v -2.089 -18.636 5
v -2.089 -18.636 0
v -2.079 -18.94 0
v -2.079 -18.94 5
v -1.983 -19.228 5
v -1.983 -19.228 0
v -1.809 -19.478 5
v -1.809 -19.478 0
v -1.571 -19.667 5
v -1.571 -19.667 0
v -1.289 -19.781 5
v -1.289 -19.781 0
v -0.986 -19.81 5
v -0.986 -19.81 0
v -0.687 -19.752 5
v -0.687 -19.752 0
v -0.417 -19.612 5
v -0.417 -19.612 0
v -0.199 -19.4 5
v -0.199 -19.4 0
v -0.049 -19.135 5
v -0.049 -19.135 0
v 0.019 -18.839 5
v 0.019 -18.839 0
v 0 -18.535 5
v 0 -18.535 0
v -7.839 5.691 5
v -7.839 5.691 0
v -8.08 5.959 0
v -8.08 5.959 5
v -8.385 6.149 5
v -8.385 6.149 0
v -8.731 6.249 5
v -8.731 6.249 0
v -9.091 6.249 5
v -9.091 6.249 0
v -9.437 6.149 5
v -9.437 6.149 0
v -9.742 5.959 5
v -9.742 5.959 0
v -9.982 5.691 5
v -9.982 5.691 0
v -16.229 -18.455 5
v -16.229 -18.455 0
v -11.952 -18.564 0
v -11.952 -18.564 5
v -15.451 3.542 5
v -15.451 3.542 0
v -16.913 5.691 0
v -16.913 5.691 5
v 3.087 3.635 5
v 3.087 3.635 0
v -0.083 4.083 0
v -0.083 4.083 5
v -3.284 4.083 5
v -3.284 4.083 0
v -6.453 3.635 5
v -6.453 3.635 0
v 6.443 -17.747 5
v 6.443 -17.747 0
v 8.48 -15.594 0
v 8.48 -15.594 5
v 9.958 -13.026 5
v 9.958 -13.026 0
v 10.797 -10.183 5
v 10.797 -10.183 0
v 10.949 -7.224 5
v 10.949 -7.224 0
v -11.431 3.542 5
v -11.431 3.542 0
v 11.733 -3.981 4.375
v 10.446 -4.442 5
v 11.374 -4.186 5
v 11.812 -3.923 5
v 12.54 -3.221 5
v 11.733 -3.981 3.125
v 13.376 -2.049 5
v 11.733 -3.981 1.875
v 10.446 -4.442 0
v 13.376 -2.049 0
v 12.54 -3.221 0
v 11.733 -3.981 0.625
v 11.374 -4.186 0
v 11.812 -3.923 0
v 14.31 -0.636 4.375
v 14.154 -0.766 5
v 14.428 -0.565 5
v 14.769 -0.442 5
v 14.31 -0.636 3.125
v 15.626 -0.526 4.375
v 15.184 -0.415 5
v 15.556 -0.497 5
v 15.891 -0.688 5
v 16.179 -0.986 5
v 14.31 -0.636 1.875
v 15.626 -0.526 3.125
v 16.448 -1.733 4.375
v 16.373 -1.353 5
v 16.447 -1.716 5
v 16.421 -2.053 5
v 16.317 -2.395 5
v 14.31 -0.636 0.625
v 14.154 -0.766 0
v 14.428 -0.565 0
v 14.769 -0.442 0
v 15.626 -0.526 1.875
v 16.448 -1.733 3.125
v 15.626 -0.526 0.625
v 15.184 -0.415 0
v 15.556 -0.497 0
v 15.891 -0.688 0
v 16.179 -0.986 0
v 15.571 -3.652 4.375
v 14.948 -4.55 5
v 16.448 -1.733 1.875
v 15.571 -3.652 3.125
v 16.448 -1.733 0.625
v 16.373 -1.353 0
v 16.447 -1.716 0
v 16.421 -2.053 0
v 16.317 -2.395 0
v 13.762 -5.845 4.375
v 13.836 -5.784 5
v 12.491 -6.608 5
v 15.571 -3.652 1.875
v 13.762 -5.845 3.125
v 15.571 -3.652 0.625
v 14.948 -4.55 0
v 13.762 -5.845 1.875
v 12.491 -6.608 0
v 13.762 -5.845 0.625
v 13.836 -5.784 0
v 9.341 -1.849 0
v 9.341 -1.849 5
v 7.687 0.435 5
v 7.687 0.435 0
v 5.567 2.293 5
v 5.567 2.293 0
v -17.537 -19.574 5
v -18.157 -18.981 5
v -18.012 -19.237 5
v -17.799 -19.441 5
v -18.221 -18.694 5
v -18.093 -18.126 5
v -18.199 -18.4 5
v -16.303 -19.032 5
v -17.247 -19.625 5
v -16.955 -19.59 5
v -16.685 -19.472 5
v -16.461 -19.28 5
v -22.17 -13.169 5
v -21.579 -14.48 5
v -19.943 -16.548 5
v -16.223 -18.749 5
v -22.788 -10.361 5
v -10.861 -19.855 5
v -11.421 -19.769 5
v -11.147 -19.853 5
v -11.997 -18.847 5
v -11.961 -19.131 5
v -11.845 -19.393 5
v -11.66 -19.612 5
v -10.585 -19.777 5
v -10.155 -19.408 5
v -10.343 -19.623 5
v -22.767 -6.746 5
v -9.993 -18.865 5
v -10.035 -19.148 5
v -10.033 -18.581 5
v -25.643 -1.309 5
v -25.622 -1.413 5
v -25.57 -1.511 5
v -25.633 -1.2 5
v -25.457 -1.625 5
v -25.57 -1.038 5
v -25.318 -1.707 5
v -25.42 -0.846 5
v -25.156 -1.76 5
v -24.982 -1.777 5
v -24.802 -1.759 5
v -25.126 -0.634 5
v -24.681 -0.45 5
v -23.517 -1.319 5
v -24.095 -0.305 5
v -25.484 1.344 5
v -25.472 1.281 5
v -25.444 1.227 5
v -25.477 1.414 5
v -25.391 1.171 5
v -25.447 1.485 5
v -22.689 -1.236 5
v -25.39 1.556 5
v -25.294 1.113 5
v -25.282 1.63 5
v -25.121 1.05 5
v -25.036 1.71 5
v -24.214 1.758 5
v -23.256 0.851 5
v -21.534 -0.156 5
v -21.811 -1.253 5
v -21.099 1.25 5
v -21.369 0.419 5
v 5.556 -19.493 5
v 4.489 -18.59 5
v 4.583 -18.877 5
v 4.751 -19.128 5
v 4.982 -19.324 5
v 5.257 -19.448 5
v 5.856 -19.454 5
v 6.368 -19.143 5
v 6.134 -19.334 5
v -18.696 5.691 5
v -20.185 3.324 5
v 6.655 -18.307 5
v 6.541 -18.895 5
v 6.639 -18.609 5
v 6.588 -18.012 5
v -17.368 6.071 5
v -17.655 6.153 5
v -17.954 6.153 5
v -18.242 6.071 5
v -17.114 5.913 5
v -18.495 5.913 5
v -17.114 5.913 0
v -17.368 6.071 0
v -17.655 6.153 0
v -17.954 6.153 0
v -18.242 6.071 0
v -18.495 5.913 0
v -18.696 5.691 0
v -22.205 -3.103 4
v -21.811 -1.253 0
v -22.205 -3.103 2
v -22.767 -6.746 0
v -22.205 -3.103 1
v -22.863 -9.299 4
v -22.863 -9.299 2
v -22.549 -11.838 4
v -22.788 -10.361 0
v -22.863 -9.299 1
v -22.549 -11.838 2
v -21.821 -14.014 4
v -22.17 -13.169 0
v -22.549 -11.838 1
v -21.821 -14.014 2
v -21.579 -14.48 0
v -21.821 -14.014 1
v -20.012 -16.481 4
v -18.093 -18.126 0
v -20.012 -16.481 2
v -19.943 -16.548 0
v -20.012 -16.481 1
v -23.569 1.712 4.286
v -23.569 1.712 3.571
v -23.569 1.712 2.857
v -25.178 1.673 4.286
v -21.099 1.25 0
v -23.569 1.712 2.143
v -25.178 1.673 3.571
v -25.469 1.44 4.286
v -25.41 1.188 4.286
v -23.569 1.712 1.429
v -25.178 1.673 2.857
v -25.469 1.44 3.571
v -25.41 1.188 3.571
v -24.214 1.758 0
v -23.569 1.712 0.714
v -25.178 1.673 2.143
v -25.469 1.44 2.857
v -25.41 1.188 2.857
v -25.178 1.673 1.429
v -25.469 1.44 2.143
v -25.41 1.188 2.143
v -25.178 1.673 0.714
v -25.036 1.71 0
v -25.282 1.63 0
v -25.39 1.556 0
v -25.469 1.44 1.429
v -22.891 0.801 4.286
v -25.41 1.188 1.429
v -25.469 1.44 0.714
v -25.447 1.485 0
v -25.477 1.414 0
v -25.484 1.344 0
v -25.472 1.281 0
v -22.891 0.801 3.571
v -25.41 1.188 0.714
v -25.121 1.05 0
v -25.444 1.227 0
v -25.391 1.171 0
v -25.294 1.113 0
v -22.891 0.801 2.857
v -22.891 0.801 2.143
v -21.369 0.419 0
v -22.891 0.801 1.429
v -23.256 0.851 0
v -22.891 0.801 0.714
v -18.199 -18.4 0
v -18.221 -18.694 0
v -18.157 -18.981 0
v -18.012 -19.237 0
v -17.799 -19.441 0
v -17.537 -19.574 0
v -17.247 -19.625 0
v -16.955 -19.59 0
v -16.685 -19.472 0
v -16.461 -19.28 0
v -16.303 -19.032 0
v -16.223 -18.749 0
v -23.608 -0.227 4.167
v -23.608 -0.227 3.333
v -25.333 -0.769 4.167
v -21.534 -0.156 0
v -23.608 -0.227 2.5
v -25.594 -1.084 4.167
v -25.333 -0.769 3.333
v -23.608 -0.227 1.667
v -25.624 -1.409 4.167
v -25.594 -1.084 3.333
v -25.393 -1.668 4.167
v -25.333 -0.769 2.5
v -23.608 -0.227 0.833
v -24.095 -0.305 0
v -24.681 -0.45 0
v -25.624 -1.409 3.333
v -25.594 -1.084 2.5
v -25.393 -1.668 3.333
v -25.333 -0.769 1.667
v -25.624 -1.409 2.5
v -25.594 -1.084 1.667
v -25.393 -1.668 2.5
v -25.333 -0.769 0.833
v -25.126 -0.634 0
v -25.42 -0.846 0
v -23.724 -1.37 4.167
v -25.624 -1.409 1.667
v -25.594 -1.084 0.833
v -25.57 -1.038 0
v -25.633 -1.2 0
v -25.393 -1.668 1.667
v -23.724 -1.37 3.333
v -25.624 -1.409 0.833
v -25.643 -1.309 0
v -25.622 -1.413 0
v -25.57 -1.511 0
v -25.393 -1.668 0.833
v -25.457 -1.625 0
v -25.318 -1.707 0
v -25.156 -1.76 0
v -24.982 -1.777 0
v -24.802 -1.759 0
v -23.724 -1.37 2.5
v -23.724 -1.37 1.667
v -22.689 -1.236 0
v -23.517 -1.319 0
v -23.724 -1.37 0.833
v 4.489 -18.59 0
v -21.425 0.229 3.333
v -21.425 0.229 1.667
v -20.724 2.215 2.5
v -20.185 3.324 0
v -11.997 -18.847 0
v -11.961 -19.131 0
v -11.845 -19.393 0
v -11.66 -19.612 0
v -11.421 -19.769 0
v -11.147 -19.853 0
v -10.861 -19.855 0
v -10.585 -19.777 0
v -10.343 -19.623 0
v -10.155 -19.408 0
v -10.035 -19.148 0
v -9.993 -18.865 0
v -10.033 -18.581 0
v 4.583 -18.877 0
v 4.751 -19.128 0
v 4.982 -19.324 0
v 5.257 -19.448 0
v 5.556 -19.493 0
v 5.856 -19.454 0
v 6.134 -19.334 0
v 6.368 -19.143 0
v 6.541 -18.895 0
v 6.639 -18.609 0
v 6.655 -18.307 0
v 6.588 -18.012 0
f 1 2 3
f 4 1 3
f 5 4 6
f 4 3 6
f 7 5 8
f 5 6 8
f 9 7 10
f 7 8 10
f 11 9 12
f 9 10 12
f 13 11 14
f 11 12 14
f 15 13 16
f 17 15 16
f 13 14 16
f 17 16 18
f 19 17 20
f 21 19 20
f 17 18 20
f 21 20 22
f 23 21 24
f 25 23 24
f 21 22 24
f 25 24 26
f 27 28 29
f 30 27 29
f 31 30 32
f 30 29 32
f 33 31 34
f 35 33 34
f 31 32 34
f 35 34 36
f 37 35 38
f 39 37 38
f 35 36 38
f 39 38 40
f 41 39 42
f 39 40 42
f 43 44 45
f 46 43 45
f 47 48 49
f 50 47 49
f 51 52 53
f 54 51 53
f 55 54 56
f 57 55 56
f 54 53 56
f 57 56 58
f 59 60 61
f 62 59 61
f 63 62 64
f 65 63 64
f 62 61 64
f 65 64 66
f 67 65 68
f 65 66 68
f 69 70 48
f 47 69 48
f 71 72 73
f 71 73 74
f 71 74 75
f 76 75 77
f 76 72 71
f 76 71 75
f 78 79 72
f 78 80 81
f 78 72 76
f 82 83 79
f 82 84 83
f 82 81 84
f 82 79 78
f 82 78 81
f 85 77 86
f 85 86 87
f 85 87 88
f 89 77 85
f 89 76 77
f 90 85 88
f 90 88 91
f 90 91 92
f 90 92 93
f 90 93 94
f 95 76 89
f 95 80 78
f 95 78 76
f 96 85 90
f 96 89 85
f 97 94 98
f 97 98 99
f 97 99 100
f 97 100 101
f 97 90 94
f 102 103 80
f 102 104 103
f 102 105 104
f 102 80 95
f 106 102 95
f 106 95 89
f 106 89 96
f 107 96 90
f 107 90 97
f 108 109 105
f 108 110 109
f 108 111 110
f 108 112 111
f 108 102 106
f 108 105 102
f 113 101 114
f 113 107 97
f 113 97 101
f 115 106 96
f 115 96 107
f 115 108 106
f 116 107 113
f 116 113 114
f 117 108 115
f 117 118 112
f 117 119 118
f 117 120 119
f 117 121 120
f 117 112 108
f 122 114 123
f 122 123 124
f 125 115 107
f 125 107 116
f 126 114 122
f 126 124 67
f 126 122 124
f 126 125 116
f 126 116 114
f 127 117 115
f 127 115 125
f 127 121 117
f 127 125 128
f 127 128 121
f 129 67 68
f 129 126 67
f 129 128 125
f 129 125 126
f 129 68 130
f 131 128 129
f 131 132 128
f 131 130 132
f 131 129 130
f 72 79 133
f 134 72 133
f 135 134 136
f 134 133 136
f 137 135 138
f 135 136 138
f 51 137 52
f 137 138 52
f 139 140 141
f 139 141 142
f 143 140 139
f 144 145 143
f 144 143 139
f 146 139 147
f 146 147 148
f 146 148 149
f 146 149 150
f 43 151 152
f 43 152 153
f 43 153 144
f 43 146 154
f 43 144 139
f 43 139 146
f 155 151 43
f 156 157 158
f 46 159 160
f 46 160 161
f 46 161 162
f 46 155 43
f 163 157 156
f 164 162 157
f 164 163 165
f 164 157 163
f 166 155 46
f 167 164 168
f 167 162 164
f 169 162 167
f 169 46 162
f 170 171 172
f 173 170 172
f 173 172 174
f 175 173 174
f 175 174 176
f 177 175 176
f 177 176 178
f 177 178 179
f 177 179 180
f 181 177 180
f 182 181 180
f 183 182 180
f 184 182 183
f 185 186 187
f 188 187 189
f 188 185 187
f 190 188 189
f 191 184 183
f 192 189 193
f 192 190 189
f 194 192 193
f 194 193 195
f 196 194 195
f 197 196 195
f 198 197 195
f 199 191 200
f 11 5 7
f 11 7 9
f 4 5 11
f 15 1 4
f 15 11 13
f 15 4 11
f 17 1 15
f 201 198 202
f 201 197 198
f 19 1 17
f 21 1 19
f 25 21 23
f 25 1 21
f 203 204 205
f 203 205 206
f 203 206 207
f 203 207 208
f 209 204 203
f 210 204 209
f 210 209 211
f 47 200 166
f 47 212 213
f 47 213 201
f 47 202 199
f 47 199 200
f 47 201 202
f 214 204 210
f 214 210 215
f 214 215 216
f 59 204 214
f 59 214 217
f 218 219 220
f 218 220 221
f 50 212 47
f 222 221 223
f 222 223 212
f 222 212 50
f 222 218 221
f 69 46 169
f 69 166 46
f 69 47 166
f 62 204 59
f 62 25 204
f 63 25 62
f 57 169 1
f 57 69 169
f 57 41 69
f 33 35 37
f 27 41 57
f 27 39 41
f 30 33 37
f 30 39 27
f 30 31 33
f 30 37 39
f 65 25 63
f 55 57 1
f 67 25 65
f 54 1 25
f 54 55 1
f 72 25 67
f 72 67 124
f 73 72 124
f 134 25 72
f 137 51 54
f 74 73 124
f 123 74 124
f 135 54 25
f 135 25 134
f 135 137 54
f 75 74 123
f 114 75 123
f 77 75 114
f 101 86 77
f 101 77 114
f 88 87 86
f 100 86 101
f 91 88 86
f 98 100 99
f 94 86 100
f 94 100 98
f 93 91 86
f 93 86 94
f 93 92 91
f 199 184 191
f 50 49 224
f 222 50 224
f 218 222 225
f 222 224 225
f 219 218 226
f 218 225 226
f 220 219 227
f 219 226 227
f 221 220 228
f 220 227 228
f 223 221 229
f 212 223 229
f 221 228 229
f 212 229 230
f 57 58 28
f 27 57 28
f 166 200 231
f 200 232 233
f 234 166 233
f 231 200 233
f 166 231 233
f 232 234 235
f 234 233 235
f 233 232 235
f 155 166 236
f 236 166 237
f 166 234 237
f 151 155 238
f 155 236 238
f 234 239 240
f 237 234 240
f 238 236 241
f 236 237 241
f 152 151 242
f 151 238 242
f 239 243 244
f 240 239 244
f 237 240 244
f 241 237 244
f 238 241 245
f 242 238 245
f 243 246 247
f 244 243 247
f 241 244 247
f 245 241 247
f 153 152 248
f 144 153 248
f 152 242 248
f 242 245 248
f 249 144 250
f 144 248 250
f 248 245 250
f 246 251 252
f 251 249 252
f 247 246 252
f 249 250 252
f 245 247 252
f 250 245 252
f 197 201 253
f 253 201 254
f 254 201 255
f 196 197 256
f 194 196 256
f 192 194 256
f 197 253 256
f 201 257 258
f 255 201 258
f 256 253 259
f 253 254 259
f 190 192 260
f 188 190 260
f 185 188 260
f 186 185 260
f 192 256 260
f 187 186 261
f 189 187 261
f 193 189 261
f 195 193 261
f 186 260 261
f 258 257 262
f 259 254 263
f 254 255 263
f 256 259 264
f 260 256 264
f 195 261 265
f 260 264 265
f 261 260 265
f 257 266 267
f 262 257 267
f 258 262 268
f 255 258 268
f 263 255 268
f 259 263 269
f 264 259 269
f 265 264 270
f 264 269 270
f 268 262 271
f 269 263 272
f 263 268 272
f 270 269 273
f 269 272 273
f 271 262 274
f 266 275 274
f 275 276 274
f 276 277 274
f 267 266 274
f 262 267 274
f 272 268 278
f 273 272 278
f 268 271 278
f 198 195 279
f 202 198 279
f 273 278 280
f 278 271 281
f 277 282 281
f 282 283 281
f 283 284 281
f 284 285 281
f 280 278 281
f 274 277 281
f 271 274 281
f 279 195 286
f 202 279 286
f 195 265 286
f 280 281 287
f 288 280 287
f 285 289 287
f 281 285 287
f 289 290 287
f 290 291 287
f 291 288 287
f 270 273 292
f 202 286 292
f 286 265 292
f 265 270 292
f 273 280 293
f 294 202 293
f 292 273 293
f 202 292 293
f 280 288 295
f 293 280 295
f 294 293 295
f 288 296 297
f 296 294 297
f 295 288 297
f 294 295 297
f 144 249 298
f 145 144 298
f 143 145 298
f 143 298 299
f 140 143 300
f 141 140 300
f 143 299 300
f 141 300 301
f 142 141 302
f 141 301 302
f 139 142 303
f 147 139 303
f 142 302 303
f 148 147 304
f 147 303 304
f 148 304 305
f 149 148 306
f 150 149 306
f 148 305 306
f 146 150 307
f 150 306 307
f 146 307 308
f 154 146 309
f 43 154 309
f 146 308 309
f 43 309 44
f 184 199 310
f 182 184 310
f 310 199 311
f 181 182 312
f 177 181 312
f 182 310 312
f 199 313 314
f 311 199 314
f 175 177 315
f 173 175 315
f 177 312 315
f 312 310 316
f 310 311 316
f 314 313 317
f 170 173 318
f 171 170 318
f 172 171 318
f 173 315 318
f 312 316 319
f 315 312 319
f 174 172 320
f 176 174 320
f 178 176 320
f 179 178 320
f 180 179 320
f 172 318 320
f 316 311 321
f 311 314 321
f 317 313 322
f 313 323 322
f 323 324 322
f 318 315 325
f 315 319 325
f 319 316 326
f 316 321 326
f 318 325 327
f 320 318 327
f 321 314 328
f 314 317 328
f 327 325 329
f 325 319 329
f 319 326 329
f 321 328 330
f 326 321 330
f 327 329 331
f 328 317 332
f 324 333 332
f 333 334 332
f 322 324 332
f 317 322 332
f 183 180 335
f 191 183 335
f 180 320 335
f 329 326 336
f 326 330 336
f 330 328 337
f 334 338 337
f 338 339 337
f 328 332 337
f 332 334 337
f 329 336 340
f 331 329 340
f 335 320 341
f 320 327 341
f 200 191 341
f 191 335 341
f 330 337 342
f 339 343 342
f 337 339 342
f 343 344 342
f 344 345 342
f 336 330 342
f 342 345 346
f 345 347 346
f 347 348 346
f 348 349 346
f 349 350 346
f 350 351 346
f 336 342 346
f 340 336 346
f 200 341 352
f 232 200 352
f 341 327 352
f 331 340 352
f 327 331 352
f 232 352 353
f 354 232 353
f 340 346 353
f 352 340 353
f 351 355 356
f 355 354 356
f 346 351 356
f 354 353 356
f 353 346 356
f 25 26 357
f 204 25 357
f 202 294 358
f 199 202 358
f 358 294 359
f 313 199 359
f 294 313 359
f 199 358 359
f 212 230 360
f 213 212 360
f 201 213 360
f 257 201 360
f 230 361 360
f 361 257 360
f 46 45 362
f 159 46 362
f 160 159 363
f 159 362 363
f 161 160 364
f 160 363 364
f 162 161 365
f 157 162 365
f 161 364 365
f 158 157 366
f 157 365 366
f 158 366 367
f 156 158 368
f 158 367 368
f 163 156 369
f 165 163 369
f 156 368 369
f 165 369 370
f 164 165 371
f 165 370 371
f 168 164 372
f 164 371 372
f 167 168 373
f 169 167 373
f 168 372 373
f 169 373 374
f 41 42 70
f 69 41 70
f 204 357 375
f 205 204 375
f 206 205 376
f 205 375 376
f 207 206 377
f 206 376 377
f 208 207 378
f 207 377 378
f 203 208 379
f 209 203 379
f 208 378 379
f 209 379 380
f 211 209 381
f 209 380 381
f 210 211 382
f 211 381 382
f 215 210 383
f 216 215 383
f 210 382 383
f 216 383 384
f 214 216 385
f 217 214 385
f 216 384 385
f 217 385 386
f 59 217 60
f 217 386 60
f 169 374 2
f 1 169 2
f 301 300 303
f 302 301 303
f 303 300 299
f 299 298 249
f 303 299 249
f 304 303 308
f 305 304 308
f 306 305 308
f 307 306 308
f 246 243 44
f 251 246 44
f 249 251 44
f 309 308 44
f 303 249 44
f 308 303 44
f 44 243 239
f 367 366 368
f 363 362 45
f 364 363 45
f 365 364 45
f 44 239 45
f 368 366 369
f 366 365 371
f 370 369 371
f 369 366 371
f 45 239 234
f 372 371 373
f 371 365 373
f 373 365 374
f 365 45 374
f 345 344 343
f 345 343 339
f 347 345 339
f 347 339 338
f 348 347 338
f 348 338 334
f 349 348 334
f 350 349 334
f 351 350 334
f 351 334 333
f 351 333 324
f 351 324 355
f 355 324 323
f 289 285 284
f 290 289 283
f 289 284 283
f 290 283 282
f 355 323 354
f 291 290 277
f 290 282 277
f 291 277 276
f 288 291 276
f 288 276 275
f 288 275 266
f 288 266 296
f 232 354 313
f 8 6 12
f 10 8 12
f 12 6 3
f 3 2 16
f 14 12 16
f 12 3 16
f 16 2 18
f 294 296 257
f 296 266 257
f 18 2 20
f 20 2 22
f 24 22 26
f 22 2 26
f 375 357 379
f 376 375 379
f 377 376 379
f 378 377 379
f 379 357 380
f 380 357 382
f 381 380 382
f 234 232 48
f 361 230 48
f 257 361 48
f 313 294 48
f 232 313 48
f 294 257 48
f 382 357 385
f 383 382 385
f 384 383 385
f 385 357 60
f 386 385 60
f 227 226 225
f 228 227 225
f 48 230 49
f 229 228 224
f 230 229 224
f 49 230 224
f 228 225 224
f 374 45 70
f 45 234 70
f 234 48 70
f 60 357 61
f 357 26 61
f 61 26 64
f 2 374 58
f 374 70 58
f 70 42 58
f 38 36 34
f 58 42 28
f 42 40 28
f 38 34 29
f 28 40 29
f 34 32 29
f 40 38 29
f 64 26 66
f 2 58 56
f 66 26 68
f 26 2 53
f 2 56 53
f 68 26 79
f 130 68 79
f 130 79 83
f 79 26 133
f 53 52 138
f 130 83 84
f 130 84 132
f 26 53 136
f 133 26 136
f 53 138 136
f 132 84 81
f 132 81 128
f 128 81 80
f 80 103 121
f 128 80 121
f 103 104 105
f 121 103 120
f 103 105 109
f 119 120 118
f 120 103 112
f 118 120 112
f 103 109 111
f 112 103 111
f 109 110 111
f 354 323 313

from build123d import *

# Parameters (mm, degrees)
F1_DEPTH = 5


with BuildPart() as f1:
    # F0 (on Top) → F1 (new body)
    with BuildSketch(Plane.XY):
        with BuildLine():
            add(Edge.make_bspline(
                [(-21.8114407323, -1.2526222444), (-21.9529955358, -1.8558107382), (-22.5042300878, -4.4975959061), (-23.2202782456, -9.1739987206), (-22.139771433, -14.0575578844), (-20.1089547521, -16.5186726713), (-18.7428019831, -17.6076660665), (-18.0927556227, -18.1258433528)],
                knots=[0.2898740891, 0.2898740891, 0.2898740891, 0.2898740891, 0.3516059803, 0.5530922378, 0.7304752816, 0.8716699309, 1, 1, 1, 1], degree=3))
            ThreePointArc((-18.0927556227, -18.1258433528), (-17.3935839447, -19.6099932849), (-16.2286459528, -18.4548043257))
            Line((-16.2286459528, -18.4548043257), (-11.9521580111, -18.5644586109))
            ThreePointArc((-11.9521580111, -18.5644586109), (-11.0039228875, -19.8642260207), (-10.0330017809, -18.5813162912))
            Line((-10.0330017809, -18.5813162912), (-2.0894149434, -18.6357257221))
            ThreePointArc((-2.0894149434, -18.6357257221), (-0.9857511229, -19.81017747), (0, -18.5351459173))
            Line((0, -18.5351459173), (4.4892215974, -18.5898928889))
            ThreePointArc((4.4892215974, -18.5898928889), (5.9989401794, -19.4034770666), (6.4432226901, -17.7470403905))
            ThreePointArc((6.4432226901, -17.7470403905), (9.9584459704, -13.0258381827), (10.9487174865, -7.2236052228))
            add(Edge.make_bspline(
                [(10.4463008096, -4.4422445204), (10.8741972144, -4.3675474393), (11.8690913168, -4.1773115011), (13.5331652433, -2.0119802219), (14.0806952433, -0.4605773182), (15.7511056613, -0.2652793882), (16.8446379611, -1.8141733756), (15.5062311575, -3.7223544079), (13.9418083475, -6.1089896659), (11.9710015695, -6.8499874791), (10.9487174865, -7.2236052228)],
                knots=[0, 0, 0, 0, 0.1032905111, 0.2470068386, 0.3581027377, 0.4596162524, 0.5663566268, 0.6946800325, 0.8436383674, 1, 1, 1, 1], degree=3))
            ThreePointArc((10.4463008096, -4.4422445204), (7.6865725324, 0.4345842042), (3.0868465244, 3.6349090665))
            ThreePointArc((3.0868465244, 3.6349090665), (-1.6830821707, 4.1394944322), (-6.4530108658, 3.6349090665))
            Line((-6.4530108658, 3.6349090665), (-7.8392599399, 5.6913481227))
            ThreePointArc((-7.8392599399, 5.6913481227), (-8.9107684121, 6.2612714829), (-9.9822768844, 5.6913481227))
            Line((-9.9822768844, 5.6913481227), (-11.4308783984, 3.5424119856))
            Line((-11.4308783984, 3.5424119856), (-15.4505299922, 3.5424119856))
            Line((-15.4505299922, 3.5424119856), (-16.9131534756, 5.6913481227))
            ThreePointArc((-16.9131534756, 5.6913481227), (-17.8046582966, 6.1629747599), (-18.6961631175, 5.6913481227))
            add(Edge.make_bspline(
                [(-18.6961631175, 5.6913481227), (-19.4285369113, 4.6153397899), (-20.3296673033, 3.2727021769), (-20.9824057089, 1.5831681063), (-21.0991354999, 1.2502842354)],
                knots=[0, 0, 0, 0, 0.1619455579, 0.2001015887, 0.2001015887, 0.2001015887, 0.2001015887], degree=3))
            add(Edge.make_bspline(
                [(-21.0991354999, 1.2502842354), (-21.1939808519, 0.9798092551), (-21.2837186334, 0.7022584), (-21.3690435276, 0.4186483175)],
                knots=[0.2001015887, 0.2001015887, 0.2001015887, 0.2001015887, 0.2311041471, 0.2311041471, 0.2311041471, 0.2311041471], degree=3))
            add(Edge.make_bspline(
                [(-21.3690435276, 0.4186483175), (-21.4258706707, 0.2297614645), (-21.4807403986, 0.0381869326), (-21.5338579347, -0.15577494)],
                knots=[0.2311041471, 0.2311041471, 0.2311041471, 0.2311041471, 0.2517521285, 0.2517521285, 0.2517521285, 0.2517521285], degree=3))
            add(Edge.make_bspline(
                [(-21.5338579347, -0.15577494), (-21.6319277937, -0.5138829189), (-21.7240248677, -0.8801287474), (-21.8114407323, -1.2526222444)],
                knots=[0.2517521285, 0.2517521285, 0.2517521285, 0.2517521285, 0.2898740891, 0.2898740891, 0.2898740891, 0.2898740891], degree=3))
        make_face()
        with BuildLine():
            add(Edge.make_bspline(
                [(-21.5338579347, -0.15577494), (-22.2120015737, -0.1084108073), (-23.5399972583, -0.1535762915), (-25.3752977452, -0.5600385686), (-25.8170028342, -1.4584373864), (-24.9213051104, -1.9865694968), (-23.7099288456, -1.1824261792), (-22.4818931077, -1.2268881647), (-21.8114407323, -1.2526222444)],
                knots=[0, 0, 0, 0, 0.2053222205, 0.3970043755, 0.5164824715, 0.6375428035, 0.802694074, 1, 1, 1, 1], degree=3))
            add(Edge.make_bspline(
                [(-21.5338579347, -0.15577494), (-21.6319277937, -0.5138829189), (-21.7240248677, -0.8801287474), (-21.8114407323, -1.2526222444)],
                knots=[0.2517521285, 0.2517521285, 0.2517521285, 0.2517521285, 0.2898740891, 0.2898740891, 0.2898740891, 0.2898740891], degree=3))
        make_face()
        with BuildLine():
            add(Edge.make_bspline(
                [(-21.0991354999, 1.2502842354), (-21.9336416547, 1.4389735678), (-23.4277348773, 1.7756429479), (-25.1450687292, 1.7862361389), (-25.5103505424, 1.4724239125), (-25.4694238607, 1.0699461681), (-24.2868908085, 0.8974097249), (-22.8783994531, 0.8784133331), (-21.8863935379, 0.5464820129), (-21.3690435276, 0.4186483175)],
                knots=[0, 0, 0, 0, 0.2119793639, 0.3816308644, 0.4632349714, 0.5312430576, 0.6687854633, 0.8325027876, 1, 1, 1, 1], degree=3))
            add(Edge.make_bspline(
                [(-21.0991354999, 1.2502842354), (-21.1939808519, 0.9798092551), (-21.2837186334, 0.7022584), (-21.3690435276, 0.4186483175)],
                knots=[0.2001015887, 0.2001015887, 0.2001015887, 0.2001015887, 0.2311041471, 0.2311041471, 0.2311041471, 0.2311041471], degree=3))
        make_face()
    extrude(amount=F1_DEPTH)


solid = f1.part
